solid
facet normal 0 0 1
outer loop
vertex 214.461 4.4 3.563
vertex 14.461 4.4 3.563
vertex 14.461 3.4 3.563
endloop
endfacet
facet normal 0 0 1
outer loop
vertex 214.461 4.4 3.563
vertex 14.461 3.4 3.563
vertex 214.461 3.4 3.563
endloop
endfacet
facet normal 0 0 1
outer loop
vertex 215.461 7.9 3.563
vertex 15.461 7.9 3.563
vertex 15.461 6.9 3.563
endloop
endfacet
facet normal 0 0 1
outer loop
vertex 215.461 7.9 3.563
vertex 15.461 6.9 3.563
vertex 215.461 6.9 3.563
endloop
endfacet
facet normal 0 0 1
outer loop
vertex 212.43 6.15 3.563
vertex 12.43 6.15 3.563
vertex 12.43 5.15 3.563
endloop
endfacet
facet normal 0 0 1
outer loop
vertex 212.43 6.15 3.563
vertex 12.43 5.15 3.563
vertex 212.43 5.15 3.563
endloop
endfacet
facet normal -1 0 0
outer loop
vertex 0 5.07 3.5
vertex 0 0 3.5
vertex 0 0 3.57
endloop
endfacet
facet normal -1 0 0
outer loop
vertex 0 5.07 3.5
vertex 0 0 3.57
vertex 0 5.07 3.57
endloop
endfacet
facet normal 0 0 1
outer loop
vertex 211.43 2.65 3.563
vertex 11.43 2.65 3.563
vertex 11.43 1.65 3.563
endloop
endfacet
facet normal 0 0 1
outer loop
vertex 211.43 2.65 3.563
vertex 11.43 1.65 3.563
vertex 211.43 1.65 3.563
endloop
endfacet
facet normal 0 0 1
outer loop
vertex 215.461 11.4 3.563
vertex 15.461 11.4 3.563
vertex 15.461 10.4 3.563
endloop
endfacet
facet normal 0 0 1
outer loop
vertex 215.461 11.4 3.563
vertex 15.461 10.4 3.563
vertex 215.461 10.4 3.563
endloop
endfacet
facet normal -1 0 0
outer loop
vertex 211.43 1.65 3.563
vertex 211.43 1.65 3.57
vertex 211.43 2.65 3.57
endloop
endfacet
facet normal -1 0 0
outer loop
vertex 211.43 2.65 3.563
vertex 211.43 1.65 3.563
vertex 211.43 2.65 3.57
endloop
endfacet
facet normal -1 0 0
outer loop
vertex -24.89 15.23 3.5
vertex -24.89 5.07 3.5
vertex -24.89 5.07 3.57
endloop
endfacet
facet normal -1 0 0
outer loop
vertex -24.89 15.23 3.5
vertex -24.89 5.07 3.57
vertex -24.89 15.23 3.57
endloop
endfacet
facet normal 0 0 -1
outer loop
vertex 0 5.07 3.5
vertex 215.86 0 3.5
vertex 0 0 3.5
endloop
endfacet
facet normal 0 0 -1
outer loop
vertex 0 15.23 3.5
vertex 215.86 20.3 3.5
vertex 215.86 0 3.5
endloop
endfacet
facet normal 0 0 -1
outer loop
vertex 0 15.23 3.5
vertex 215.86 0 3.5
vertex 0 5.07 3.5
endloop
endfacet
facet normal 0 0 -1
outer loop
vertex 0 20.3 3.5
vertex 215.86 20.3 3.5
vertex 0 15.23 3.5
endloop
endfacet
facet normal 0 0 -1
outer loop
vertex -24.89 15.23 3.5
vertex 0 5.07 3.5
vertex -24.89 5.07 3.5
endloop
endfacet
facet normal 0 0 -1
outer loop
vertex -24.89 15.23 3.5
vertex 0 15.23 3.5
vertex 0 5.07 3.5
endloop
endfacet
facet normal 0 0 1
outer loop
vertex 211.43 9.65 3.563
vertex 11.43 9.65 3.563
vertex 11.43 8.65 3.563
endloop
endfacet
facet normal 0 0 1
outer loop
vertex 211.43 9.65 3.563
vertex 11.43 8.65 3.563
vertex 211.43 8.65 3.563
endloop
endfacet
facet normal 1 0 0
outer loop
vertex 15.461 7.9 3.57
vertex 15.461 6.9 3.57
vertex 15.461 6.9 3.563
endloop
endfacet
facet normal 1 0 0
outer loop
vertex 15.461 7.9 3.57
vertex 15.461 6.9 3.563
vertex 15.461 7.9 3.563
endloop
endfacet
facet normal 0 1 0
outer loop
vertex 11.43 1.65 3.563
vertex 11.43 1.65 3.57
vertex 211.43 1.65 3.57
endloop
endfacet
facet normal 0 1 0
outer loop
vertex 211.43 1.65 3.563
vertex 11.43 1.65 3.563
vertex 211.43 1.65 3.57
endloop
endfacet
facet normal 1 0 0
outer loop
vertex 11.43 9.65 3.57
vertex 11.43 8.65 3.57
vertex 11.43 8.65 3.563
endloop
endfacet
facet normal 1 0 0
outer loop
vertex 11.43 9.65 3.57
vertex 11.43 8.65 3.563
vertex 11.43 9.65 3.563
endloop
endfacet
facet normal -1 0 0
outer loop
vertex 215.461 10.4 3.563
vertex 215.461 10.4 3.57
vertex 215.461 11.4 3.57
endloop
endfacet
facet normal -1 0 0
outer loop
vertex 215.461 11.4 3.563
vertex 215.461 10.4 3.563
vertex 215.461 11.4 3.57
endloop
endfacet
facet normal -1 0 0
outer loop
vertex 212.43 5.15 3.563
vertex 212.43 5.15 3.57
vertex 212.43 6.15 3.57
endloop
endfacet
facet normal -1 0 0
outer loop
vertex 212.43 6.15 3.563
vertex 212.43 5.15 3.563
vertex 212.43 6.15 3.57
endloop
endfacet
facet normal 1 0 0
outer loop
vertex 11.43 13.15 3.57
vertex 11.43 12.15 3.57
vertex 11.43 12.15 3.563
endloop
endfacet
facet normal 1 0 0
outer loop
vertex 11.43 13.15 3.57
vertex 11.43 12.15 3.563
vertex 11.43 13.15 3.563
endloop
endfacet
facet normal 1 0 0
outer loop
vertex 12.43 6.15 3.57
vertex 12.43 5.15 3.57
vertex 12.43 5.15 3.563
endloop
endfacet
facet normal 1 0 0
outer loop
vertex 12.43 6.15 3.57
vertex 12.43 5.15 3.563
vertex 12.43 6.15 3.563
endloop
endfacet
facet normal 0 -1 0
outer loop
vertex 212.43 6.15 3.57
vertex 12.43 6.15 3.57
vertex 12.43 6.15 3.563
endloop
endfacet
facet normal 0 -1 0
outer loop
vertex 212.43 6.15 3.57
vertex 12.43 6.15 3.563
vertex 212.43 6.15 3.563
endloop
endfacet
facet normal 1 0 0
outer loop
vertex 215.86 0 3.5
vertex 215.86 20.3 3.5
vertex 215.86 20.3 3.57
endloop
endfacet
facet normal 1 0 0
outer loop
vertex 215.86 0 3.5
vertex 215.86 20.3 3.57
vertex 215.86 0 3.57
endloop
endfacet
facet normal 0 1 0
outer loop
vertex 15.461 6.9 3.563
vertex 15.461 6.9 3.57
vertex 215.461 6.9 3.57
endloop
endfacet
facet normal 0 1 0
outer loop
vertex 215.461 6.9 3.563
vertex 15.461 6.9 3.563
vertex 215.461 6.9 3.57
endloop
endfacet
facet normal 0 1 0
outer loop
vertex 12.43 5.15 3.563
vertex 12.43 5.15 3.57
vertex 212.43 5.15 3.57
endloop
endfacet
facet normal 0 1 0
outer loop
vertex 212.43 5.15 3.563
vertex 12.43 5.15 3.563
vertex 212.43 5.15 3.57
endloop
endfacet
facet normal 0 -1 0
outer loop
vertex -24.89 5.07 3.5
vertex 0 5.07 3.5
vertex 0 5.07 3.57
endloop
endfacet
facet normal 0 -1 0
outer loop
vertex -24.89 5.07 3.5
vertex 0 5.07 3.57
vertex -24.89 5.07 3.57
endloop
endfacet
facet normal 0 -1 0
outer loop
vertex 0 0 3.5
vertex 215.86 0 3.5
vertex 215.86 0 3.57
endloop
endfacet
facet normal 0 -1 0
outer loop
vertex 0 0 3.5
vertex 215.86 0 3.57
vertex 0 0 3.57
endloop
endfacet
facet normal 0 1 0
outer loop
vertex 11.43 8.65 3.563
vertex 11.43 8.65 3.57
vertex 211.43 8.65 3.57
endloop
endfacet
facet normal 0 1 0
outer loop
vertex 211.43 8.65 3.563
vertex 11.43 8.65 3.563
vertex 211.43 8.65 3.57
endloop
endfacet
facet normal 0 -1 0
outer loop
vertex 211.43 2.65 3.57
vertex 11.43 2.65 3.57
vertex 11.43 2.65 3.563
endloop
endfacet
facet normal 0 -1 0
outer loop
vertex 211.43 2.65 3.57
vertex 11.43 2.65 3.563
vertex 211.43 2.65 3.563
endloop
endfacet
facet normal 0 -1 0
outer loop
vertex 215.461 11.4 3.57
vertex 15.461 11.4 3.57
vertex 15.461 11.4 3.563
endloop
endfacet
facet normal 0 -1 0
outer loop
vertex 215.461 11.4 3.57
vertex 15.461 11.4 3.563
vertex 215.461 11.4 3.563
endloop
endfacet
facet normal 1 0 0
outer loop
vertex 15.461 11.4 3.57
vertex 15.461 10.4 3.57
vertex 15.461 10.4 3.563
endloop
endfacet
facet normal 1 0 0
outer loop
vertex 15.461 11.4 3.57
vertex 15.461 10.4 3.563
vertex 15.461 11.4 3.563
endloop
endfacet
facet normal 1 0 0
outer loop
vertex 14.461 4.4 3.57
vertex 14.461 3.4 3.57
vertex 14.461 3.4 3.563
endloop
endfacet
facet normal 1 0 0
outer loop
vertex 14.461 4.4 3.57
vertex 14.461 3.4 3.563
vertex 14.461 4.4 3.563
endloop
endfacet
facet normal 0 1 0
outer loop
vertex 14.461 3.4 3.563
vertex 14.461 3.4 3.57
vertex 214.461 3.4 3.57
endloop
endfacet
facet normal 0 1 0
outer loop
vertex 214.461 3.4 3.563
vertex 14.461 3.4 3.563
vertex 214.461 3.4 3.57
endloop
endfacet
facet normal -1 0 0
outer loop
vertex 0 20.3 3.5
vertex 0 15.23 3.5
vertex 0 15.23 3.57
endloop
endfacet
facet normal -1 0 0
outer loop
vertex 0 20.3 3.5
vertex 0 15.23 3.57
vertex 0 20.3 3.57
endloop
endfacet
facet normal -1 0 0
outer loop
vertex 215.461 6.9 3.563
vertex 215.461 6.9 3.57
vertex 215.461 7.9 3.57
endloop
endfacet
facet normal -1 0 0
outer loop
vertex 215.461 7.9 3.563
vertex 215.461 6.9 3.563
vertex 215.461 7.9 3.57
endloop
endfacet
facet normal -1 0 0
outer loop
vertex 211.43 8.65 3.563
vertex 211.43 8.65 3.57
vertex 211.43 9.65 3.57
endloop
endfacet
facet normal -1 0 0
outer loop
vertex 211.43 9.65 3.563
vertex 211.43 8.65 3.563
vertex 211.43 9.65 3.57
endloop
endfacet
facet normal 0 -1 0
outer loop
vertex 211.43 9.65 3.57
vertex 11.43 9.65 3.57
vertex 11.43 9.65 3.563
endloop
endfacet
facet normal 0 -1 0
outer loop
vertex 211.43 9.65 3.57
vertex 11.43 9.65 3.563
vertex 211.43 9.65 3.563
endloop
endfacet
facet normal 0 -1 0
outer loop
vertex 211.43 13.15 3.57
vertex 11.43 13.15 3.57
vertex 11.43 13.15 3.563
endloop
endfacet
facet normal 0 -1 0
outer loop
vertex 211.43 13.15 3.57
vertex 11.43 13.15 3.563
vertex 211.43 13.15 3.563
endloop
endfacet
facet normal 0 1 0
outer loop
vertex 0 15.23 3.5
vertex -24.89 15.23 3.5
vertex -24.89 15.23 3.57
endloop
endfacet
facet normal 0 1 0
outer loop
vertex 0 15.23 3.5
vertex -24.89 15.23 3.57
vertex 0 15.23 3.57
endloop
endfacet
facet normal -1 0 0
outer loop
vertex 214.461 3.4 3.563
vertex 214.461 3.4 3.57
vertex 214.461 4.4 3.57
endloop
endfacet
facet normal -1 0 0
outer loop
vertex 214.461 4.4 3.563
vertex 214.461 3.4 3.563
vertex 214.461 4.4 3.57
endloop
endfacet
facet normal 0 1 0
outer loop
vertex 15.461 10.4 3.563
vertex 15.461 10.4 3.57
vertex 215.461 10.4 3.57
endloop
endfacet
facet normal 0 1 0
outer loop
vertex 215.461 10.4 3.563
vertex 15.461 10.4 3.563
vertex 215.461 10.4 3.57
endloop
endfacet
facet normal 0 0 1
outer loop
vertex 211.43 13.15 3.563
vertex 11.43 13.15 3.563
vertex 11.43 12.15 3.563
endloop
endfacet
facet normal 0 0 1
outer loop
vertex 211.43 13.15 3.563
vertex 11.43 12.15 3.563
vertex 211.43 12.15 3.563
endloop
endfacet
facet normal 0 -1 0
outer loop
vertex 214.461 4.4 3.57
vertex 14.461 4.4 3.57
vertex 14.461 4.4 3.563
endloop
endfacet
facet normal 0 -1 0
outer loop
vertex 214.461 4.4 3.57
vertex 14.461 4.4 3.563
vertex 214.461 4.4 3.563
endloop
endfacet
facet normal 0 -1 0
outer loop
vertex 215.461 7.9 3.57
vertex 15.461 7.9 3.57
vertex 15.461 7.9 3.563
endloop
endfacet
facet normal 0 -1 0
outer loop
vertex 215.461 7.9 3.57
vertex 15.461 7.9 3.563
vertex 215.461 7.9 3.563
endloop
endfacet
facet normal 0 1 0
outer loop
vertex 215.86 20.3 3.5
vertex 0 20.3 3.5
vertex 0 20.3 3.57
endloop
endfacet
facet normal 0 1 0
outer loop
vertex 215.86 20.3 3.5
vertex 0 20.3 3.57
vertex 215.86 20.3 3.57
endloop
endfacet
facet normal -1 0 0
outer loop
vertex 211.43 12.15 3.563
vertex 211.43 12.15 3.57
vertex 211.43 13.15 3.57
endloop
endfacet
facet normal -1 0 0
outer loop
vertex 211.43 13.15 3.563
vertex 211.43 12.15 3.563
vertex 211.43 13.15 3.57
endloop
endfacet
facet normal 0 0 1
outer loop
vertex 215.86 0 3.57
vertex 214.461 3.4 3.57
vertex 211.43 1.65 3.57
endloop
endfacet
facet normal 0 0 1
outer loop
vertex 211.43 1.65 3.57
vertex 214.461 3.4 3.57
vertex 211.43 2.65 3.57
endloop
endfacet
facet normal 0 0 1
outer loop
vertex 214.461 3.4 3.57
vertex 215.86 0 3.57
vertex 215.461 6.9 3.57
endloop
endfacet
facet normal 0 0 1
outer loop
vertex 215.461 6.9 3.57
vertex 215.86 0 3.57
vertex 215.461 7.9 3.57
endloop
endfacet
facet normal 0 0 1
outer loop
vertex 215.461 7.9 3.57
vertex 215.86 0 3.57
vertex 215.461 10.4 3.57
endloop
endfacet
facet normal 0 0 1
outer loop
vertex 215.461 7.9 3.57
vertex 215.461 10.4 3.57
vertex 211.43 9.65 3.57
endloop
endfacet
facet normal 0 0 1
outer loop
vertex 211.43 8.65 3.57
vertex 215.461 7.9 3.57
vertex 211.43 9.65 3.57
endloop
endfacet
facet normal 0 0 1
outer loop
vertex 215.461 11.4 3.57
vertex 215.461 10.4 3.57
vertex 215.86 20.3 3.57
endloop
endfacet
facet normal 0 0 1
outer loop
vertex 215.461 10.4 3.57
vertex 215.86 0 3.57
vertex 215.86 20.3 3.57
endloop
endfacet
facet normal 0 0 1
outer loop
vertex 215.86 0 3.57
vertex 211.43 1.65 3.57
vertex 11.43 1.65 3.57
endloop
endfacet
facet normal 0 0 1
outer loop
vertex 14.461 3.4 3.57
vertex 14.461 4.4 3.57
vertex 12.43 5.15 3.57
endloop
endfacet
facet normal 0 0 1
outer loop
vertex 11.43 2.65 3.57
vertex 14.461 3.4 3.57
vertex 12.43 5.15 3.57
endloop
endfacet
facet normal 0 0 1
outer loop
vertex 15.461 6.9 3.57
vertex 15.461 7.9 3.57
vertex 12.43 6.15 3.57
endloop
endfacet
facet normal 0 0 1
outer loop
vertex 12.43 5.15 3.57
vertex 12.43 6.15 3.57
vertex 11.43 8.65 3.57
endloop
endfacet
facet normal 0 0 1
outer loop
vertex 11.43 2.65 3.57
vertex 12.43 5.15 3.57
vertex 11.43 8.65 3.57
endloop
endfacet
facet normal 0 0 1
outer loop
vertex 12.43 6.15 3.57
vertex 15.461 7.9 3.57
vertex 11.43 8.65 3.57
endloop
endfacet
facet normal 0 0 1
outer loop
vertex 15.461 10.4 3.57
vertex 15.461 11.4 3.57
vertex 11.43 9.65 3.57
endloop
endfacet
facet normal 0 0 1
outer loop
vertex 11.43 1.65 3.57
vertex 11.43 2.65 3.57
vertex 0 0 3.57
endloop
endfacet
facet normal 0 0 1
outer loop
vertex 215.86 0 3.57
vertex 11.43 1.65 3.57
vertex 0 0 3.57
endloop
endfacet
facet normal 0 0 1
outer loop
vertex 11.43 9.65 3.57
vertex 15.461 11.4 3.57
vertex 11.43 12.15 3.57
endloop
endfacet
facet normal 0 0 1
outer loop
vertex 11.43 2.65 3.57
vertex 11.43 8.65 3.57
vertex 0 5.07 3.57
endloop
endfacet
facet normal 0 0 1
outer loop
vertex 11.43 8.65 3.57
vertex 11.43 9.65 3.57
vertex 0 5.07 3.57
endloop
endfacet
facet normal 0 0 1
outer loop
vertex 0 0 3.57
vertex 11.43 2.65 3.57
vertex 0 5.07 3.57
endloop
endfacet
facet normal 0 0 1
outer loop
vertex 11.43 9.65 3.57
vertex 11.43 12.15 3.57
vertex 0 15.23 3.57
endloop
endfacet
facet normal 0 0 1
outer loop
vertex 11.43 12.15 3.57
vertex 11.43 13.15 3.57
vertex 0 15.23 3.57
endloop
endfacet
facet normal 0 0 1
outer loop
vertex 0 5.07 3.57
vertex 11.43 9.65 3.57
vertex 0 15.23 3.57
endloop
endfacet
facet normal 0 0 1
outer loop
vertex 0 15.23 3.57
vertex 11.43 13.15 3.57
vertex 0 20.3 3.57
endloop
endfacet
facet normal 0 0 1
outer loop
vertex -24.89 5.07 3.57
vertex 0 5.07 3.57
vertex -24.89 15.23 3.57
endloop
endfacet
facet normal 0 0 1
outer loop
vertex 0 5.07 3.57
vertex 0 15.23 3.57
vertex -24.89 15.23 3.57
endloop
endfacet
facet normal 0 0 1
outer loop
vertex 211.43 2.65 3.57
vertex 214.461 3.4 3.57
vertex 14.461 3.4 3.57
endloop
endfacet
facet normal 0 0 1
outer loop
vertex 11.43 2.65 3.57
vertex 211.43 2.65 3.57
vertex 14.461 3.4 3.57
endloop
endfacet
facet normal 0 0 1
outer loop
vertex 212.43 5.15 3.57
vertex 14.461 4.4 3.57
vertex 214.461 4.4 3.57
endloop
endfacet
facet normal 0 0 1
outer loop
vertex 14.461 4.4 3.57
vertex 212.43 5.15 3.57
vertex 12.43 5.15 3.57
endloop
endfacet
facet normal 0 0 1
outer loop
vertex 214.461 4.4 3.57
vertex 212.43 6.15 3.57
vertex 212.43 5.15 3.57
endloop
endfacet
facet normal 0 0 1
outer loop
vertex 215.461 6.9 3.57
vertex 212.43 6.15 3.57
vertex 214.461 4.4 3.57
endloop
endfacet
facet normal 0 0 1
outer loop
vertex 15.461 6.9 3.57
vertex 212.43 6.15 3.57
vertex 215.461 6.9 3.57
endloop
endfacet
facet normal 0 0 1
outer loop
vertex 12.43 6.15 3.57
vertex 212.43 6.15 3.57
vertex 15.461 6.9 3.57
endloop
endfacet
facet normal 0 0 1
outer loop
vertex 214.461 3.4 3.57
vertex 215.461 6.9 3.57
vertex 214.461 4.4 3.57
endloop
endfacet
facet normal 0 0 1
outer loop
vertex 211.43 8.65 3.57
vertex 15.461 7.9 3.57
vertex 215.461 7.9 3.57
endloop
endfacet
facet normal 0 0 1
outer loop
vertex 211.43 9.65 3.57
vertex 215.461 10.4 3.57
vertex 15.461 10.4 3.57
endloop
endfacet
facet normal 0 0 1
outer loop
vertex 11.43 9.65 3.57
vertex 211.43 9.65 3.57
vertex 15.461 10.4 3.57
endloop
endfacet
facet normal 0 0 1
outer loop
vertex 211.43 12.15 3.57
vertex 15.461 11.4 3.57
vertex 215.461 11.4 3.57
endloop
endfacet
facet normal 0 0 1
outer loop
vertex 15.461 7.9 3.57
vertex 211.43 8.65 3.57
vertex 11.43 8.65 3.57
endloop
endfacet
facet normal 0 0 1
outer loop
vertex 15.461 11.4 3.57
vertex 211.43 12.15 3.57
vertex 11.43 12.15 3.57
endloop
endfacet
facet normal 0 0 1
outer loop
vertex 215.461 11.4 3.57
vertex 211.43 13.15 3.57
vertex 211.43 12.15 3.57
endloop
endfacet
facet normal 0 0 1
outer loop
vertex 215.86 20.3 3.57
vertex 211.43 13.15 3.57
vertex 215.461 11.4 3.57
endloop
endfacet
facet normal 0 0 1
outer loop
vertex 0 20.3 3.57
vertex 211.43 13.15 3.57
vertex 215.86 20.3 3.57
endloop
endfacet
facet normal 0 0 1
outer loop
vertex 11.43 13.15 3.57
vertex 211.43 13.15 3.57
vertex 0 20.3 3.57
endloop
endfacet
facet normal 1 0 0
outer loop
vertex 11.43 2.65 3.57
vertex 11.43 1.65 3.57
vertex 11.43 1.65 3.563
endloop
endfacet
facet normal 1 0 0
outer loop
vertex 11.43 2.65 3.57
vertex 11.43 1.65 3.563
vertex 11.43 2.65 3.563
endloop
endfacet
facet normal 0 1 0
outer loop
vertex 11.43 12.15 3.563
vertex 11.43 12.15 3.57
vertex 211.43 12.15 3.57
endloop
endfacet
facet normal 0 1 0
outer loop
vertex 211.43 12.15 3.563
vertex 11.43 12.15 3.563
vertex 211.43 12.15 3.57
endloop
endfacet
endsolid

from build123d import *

# Parameters (mm, degrees)
PAD_DEPTH    = 0.07
SKETCH001_W  = 200
SKETCH001_H  = 1
POCKET_DEPTH = 0.007


with BuildPart() as part:
    # Sketch (on Face14 of Binder) → Pad (new body)
    with BuildSketch(Plane.XY.offset(3.5)):
        Polygon((0, 20.3), (215.86, 20.3), (215.86, 0), (0, 0), (0, 5.07), (-24.89, 5.07), (-24.89, 15.23), (0, 15.23), align=None)
    extrude(amount=PAD_DEPTH)

    # Sketch001 (on Face10 of Pad) → Pocket (cut)
    with BuildSketch(Plane.XY.offset(3.57)):
        with Locations((115.461089, 7.4)):
            Rectangle(SKETCH001_W, SKETCH001_H)
        with Locations((111.43, 2.15)):
            Rectangle(SKETCH001_W, SKETCH001_H)
        with Locations((114.461089, 3.9)):
            Rectangle(SKETCH001_W, SKETCH001_H)
        with Locations((111.43, 9.15)):
            Rectangle(SKETCH001_W, SKETCH001_H)
        with Locations((111.43, 12.65)):
            Rectangle(SKETCH001_W, SKETCH001_H)
        with Locations((112.43, 5.65)):
            Rectangle(SKETCH001_W, SKETCH001_H)
        with Locations((115.461089, 10.9)):
            Rectangle(SKETCH001_W, SKETCH001_H)
    extrude(amount=-POCKET_DEPTH, mode=Mode.SUBTRACT)


solid = part.part
